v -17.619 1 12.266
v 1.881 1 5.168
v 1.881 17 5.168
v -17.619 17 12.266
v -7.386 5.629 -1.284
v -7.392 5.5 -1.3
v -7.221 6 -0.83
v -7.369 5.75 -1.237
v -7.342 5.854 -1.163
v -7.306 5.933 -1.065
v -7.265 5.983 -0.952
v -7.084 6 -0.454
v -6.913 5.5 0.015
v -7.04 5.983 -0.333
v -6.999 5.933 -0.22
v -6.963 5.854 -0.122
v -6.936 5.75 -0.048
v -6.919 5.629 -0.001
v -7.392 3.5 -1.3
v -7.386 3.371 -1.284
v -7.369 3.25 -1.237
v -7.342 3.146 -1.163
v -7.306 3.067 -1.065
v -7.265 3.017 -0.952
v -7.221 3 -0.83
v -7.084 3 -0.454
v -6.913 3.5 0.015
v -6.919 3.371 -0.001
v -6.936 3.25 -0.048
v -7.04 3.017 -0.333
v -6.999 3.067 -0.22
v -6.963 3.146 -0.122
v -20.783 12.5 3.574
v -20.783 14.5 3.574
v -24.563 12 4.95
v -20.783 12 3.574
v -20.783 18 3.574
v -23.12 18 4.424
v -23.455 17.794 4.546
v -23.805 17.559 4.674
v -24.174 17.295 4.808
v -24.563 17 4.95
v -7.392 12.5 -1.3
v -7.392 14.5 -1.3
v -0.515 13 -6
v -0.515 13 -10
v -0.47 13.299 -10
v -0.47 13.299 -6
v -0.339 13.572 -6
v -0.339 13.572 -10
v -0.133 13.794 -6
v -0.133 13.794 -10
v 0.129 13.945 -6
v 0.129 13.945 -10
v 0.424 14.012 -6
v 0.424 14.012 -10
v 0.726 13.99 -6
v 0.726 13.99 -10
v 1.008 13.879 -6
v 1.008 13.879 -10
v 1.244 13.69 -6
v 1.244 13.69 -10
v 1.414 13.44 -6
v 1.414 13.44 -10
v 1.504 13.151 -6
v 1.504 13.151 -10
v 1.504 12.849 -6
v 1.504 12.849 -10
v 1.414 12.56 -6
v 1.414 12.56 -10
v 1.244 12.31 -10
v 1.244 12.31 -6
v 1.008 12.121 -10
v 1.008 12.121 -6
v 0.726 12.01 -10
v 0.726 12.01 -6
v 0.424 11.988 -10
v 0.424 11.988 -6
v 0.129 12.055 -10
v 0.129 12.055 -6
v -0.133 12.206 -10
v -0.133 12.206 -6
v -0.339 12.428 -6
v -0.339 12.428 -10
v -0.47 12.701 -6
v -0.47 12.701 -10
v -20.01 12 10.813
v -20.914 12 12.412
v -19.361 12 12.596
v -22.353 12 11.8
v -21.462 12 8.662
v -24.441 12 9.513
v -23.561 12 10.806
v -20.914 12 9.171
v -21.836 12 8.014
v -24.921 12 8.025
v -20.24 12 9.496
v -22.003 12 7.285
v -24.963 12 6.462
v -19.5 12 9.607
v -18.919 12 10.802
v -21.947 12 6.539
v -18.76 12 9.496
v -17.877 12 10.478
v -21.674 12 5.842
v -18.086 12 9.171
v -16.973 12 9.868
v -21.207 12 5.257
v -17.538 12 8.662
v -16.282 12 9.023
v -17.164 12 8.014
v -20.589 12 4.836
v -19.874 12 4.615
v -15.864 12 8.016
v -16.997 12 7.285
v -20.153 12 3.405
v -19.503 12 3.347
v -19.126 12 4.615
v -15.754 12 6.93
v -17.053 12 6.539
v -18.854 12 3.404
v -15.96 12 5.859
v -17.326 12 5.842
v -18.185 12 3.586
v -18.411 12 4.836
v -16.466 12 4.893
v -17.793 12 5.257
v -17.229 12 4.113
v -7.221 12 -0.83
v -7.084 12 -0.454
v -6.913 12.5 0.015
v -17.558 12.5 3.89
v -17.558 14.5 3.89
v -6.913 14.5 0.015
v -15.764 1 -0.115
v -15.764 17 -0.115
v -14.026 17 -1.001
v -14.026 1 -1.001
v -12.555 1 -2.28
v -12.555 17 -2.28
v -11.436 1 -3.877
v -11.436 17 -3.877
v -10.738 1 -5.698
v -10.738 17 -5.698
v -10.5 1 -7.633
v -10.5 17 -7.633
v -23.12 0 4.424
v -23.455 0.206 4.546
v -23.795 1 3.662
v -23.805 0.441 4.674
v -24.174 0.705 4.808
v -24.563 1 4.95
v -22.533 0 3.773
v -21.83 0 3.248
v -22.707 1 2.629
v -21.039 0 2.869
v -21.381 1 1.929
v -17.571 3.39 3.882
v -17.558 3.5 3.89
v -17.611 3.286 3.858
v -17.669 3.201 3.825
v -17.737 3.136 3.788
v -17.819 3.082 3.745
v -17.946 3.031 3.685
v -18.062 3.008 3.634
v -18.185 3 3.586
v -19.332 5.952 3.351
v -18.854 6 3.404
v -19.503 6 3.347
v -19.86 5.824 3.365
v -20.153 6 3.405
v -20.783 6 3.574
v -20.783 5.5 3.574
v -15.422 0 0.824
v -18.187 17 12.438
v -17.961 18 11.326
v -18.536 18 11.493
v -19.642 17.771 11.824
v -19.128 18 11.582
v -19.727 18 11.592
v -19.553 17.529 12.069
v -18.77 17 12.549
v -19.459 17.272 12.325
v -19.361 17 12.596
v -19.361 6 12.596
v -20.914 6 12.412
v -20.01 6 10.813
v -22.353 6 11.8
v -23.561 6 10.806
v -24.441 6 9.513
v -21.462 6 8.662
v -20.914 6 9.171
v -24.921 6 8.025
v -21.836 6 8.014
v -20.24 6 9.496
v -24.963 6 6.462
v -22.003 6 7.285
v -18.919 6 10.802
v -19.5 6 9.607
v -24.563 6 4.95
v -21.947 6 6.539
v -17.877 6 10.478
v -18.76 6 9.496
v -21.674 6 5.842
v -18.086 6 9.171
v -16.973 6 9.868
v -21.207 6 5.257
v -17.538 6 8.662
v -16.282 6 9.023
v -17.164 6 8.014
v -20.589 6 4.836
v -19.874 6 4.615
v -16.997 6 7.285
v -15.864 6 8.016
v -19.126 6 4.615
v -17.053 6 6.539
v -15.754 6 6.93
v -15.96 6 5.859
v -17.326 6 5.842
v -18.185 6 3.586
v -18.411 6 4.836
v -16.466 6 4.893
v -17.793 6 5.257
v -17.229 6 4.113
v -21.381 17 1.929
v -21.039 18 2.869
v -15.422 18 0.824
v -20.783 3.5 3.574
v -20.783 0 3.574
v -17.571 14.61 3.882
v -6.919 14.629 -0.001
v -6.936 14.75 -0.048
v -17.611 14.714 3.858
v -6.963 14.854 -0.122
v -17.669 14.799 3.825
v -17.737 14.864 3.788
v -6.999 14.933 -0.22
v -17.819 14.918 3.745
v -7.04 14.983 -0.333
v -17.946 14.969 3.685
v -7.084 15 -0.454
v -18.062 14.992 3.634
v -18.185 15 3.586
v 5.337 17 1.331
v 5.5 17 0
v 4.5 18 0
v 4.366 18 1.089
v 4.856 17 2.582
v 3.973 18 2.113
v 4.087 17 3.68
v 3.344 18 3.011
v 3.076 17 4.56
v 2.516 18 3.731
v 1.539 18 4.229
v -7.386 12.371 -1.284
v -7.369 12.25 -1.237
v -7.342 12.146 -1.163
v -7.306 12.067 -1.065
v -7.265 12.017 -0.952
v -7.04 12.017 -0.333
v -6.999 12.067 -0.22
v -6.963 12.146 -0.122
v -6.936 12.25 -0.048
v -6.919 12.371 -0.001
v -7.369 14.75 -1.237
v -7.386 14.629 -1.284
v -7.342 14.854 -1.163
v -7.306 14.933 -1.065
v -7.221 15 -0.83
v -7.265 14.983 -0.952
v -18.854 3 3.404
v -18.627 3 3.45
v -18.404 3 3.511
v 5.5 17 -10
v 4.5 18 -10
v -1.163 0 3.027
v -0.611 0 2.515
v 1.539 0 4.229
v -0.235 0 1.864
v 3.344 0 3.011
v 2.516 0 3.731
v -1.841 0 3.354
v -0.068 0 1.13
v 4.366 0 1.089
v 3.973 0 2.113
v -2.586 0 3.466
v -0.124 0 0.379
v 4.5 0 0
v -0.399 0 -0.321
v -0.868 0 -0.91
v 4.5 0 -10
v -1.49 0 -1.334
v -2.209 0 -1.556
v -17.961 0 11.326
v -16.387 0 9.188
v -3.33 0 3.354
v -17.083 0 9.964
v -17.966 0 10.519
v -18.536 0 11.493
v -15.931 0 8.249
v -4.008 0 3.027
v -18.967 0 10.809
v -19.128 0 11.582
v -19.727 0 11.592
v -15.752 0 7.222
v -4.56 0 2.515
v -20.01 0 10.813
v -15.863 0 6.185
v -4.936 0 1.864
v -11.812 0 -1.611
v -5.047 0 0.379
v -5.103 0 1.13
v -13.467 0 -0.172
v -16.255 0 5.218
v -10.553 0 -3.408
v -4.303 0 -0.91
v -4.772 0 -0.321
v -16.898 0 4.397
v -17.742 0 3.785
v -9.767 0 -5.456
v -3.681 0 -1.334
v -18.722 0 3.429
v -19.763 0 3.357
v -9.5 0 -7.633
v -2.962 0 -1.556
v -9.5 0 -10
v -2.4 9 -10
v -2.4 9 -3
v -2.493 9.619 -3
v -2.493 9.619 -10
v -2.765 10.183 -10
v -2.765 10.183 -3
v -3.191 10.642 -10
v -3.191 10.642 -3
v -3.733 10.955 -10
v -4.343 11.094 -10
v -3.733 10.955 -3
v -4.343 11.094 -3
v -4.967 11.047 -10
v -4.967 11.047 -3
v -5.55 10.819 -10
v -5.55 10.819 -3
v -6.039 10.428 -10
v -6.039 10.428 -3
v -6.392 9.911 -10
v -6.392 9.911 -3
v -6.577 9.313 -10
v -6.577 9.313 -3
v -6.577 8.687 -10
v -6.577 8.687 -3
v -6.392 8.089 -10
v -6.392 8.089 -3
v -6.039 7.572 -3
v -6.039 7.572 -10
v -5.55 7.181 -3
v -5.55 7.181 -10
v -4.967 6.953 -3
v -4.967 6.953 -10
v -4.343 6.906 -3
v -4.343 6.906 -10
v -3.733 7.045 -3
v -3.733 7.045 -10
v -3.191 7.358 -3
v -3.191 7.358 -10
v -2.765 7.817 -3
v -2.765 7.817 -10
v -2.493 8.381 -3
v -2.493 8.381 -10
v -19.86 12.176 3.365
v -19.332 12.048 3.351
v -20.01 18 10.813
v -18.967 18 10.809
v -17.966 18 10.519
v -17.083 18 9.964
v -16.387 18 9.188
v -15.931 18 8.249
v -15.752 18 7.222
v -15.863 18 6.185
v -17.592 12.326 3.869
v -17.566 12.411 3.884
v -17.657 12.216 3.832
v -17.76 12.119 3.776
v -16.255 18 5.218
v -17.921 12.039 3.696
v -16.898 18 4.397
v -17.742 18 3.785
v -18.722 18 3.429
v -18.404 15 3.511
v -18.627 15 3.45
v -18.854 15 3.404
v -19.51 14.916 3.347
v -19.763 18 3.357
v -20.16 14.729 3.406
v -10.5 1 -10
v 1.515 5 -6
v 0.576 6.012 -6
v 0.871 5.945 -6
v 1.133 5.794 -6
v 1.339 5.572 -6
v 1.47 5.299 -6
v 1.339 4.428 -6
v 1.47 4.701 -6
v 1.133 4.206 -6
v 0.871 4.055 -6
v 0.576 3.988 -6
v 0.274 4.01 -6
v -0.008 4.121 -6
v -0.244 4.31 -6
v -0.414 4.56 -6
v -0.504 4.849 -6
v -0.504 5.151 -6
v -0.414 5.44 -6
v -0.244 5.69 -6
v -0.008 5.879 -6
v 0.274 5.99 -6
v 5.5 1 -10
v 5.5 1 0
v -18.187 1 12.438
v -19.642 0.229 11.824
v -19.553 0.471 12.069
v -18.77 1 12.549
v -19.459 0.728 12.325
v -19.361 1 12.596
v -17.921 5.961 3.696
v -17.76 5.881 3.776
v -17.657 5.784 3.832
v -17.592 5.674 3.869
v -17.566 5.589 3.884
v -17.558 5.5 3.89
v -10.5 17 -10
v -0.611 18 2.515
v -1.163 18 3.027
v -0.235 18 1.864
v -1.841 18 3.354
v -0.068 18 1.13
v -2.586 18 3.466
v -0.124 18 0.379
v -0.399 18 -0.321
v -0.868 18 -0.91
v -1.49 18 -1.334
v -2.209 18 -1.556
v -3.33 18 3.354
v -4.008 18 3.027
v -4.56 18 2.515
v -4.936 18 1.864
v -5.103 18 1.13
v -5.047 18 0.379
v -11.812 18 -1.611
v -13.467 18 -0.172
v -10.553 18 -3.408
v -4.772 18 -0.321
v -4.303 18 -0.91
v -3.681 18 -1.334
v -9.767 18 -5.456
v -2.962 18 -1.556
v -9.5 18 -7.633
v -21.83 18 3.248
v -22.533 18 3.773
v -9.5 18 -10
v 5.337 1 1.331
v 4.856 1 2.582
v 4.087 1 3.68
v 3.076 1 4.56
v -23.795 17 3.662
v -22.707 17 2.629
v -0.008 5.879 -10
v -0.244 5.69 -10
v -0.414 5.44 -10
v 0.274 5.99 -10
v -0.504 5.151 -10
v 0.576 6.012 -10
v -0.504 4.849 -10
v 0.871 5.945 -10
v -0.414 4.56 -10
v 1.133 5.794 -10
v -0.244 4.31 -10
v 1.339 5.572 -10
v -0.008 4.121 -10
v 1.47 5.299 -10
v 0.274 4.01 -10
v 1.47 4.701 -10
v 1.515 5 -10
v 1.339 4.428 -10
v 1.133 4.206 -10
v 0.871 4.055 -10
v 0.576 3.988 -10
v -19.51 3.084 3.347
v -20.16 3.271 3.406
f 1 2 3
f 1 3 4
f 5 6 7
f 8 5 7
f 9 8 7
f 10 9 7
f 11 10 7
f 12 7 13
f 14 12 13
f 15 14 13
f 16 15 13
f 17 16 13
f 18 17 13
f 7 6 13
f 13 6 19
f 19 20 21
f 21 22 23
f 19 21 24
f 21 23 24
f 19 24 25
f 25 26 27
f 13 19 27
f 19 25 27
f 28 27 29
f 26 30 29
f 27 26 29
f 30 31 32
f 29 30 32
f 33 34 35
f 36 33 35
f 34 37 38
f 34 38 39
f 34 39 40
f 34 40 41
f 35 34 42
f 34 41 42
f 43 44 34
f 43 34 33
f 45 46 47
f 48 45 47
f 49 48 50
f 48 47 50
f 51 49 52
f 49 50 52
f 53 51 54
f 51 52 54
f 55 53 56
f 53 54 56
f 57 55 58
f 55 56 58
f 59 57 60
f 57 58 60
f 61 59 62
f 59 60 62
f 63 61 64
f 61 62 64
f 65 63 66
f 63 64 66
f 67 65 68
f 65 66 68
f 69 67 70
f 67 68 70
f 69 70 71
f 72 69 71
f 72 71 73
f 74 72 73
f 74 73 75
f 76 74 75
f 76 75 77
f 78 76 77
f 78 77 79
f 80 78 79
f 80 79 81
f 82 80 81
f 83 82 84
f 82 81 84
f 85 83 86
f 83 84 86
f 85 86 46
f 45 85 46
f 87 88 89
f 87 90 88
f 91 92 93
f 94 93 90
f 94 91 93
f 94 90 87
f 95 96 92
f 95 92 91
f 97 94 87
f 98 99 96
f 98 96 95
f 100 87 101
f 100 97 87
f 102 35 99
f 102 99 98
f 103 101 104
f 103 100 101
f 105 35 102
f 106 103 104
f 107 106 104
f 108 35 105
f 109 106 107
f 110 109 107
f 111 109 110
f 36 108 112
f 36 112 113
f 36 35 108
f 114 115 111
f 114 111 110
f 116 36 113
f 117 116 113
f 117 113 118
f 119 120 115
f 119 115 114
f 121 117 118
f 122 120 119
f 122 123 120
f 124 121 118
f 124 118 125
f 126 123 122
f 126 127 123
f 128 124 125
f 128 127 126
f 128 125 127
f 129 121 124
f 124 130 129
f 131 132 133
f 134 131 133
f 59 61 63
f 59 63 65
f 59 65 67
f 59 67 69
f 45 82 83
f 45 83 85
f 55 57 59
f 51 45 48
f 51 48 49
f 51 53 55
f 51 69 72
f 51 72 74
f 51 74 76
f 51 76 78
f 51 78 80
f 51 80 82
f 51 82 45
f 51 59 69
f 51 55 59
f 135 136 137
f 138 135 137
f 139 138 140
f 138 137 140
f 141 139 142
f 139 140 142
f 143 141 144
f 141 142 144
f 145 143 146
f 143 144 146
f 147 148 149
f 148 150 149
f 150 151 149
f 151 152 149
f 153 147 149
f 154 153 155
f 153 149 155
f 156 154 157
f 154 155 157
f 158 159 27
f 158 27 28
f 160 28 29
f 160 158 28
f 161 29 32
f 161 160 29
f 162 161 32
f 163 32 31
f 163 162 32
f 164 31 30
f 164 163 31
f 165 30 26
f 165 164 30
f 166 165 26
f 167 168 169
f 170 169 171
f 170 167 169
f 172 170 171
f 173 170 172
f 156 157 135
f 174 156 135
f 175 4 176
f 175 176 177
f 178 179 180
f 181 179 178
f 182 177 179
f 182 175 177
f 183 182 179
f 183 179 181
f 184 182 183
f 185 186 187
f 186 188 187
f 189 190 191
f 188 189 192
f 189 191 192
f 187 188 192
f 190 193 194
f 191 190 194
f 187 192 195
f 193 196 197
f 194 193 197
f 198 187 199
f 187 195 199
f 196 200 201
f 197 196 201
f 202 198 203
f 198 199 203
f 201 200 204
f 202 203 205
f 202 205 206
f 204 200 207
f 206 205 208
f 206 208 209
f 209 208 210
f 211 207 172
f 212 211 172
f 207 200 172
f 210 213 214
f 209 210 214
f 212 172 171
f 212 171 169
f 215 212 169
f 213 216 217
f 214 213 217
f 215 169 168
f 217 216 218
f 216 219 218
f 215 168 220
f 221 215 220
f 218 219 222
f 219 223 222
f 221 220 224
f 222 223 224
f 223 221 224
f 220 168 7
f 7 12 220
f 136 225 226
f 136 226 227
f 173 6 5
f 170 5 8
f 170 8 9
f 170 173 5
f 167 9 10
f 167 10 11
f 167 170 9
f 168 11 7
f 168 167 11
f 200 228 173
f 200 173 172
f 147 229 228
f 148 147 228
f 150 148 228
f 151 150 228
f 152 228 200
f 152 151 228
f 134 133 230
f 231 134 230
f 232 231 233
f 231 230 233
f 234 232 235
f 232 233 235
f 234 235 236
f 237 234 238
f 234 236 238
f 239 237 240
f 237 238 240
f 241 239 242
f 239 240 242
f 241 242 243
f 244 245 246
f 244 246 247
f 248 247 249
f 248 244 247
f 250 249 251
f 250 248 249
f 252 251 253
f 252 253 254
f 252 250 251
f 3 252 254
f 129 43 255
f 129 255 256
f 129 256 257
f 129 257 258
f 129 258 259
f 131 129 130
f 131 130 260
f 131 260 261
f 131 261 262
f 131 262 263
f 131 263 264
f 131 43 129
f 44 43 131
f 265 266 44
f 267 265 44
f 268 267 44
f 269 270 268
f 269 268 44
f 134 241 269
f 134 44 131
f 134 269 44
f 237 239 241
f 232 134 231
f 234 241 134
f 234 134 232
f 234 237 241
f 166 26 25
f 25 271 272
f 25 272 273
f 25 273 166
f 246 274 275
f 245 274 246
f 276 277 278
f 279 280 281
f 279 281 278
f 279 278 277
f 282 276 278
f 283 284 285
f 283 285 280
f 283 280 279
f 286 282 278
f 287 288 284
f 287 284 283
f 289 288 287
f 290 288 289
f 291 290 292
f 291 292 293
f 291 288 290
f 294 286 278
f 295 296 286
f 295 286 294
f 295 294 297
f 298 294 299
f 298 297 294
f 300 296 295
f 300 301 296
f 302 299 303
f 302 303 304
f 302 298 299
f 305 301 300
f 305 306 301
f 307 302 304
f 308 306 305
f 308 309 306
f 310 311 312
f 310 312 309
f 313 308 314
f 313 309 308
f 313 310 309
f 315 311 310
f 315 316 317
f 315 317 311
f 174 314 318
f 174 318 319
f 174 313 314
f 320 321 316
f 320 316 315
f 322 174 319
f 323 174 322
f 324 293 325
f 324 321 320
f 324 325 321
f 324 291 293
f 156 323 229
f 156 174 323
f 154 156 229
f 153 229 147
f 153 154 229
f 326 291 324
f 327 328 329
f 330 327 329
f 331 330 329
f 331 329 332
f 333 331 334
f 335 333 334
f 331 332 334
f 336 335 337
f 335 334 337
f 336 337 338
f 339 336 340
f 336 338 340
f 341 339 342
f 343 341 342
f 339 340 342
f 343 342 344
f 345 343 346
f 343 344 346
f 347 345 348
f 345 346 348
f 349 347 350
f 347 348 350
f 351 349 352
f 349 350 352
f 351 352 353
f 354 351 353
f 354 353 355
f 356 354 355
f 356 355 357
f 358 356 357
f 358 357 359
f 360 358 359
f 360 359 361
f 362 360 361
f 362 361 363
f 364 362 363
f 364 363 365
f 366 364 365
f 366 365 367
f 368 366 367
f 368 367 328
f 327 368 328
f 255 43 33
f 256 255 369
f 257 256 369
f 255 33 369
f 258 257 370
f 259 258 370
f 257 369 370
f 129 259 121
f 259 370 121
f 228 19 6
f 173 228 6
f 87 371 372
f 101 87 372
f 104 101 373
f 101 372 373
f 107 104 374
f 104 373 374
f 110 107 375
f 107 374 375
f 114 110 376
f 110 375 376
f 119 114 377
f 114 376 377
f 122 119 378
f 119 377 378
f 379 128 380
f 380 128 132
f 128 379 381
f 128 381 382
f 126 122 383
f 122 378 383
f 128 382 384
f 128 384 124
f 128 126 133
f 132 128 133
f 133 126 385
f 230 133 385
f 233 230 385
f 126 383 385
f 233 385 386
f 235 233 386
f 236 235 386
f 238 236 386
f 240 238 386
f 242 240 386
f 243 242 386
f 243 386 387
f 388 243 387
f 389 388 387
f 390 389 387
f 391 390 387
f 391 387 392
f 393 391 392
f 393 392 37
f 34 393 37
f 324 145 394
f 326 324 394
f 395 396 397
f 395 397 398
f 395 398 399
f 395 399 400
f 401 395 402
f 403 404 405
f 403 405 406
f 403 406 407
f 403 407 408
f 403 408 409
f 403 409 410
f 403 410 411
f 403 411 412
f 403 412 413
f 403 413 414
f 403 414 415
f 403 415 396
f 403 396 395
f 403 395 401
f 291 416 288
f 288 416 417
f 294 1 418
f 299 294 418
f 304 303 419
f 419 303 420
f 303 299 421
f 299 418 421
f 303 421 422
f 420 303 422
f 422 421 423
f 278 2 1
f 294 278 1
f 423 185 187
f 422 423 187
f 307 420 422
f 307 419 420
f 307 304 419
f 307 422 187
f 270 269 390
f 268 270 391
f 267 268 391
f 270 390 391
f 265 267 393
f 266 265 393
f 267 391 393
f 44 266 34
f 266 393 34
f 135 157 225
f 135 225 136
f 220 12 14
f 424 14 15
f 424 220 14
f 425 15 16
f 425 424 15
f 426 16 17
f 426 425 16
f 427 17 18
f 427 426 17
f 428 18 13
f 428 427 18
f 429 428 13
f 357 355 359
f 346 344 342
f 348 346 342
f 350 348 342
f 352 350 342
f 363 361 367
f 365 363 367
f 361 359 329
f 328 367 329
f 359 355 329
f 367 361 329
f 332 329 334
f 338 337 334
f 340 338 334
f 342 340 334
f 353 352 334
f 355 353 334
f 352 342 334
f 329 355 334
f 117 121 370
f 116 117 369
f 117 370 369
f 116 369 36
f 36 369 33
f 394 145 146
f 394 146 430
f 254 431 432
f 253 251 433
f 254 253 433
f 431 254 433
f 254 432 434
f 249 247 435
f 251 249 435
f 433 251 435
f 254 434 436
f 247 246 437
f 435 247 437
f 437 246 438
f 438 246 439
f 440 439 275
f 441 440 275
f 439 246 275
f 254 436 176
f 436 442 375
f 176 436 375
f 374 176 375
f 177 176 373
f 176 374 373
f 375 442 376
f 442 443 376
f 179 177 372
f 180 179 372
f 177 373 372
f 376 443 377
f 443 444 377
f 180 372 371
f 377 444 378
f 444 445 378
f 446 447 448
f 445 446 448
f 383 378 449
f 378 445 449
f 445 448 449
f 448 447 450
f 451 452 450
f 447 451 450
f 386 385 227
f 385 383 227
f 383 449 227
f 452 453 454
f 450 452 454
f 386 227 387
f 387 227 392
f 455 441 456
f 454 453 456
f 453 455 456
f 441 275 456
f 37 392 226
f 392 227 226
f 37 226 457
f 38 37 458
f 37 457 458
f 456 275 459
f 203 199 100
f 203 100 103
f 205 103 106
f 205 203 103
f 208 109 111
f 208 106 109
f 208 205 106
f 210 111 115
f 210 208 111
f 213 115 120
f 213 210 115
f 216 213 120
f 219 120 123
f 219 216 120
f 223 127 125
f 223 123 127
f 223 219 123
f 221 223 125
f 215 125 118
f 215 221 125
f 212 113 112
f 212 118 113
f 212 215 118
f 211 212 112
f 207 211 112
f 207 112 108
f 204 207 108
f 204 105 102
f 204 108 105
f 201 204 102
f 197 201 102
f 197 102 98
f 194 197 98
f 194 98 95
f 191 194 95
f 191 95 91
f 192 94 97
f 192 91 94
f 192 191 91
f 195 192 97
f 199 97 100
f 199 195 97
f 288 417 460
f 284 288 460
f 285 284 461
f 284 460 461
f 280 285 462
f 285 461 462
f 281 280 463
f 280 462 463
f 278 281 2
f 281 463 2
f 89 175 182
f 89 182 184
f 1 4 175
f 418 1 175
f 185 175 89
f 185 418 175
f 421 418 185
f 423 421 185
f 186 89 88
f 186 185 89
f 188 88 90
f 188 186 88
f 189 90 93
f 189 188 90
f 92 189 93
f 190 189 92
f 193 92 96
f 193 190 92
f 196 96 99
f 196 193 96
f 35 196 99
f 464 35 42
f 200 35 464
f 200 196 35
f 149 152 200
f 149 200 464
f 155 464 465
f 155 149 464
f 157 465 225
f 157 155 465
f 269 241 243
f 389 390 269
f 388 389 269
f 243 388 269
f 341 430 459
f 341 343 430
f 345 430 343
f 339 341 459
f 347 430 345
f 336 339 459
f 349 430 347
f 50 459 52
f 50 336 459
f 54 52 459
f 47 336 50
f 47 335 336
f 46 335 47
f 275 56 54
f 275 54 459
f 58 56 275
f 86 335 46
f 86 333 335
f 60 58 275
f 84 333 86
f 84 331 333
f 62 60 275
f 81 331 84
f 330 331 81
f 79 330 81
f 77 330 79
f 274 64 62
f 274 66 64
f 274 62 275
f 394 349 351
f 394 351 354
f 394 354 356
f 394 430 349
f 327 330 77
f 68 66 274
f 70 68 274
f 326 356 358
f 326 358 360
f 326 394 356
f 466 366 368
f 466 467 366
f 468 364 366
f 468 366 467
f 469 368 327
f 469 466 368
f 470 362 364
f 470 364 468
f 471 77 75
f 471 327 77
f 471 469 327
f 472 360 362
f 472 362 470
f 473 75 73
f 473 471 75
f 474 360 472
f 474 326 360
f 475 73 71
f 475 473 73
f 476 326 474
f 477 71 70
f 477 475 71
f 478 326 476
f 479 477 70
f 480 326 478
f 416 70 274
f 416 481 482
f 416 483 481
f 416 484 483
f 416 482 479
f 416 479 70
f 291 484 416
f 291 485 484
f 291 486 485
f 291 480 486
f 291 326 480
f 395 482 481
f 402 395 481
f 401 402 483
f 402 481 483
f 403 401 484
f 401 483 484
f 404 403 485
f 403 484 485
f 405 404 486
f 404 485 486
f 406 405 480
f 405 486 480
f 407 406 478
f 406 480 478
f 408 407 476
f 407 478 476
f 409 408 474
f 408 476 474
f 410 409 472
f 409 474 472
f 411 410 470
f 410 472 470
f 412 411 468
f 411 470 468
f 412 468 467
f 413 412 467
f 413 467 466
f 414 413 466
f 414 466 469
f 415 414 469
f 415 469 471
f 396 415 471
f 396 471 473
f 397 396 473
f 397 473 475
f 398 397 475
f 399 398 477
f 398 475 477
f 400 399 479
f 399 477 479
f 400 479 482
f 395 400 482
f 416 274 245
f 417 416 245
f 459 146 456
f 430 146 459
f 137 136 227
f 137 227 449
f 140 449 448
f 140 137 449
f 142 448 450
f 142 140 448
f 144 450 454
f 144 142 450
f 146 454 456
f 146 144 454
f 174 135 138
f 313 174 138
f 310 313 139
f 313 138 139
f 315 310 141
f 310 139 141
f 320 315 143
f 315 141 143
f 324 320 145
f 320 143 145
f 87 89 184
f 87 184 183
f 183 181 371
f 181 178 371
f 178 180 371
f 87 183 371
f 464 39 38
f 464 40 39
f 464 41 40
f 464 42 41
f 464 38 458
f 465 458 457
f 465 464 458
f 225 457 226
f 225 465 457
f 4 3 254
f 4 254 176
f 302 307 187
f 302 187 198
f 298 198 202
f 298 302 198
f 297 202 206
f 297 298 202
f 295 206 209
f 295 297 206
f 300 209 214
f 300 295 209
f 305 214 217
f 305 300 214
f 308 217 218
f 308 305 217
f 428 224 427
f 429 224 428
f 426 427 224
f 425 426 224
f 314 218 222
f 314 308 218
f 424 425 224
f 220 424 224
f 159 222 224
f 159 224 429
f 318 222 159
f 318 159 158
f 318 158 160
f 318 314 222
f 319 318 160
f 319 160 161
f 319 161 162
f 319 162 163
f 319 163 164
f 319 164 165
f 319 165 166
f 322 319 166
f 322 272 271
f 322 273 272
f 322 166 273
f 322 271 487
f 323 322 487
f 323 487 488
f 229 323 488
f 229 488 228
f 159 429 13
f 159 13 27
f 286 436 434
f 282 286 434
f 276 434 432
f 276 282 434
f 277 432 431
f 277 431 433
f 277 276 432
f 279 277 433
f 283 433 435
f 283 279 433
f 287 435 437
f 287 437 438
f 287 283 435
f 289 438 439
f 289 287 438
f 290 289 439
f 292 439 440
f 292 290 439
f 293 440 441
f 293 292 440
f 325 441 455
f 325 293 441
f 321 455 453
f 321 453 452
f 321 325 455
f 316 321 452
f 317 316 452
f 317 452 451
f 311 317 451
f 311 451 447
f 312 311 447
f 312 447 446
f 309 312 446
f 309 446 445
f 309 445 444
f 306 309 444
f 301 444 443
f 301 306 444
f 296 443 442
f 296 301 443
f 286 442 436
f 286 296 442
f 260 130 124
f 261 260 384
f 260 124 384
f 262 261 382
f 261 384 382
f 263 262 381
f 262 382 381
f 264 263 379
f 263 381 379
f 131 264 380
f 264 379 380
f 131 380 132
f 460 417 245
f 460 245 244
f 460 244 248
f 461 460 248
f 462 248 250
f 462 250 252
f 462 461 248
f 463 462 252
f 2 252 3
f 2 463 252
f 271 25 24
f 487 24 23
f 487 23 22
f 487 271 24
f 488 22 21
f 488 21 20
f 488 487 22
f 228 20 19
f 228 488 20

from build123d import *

# Parameters (mm, degrees)
SKETCH_1_R             = 2.51
SKETCH_1_R_2           = 2.525
EXTRUDE_1_DEPTH        = 18
SKETCH_11_R            = 3.75
CUT_EXTRUDE_5_DEPTH    = 6
FILLET_1_R             = 8
SKETCH_12_R            = 2
CUT_EXTRUDE_6_DEPTH    = 7
CHAMFER_1_SIZE         = 1
CUT_EXTRUDE_8_DEPTH    = 6
SKETCH_18_R            = 1.015
CUT_EXTRUDE_10_DEPTH   = 4
CUT_EXTRUDE_11_DEPTH   = 16
HOLE_WIZARD_M5_1_D     = 4.2
HOLE_WIZARD_M5_1_DEPTH = 7


with BuildPart() as part:
    # 草图1 → 凸台-拉伸1 (new body)
    with BuildSketch(Plane(origin=(0, 0, 0), x_dir=(1, 0, 0), z_dir=(0, 1, 0))):
        with BuildLine():
            Line((-21.381110788, -1.929110154), (-10.5, 2.031290289))
            Line((-10.5, 2.031290289), (-10.5, 10))
            Line((-10.5, 10), (5.5, 10))
            Line((5.5, 10), (5.5, 0))
            ThreePointArc((5.5, 0), (4.505336244, -3.1546704), (1.881110788, -5.168309414))
            Line((1.881110788, -5.168309414), (-17.618889212, -12.265728983))
            ThreePointArc((-17.618889212, -12.265728983), (-24.668309414, -8.978530356), (-21.381110788, -1.929110154))
        make_face()
        with Locations(Location((-19.5, -7.097419568, 0), (0, 0, 270))):
            Circle(SKETCH_1_R, mode=Mode.SUBTRACT)
        with Locations(Location((-2.585532826, -0.941056988, 0), (0, 0, 270))):
            Circle(SKETCH_1_R_2, mode=Mode.SUBTRACT)
    extrude(amount=EXTRUDE_1_DEPTH)

    # 草图11 → 切除-拉伸5 (cut)
    with BuildSketch(Plane(origin=(0, 18, 0), x_dir=(1, 0, 0), z_dir=(0, 1, 0))):
        with Locations(Location((-19.5, -7.097419568, 0), (0, 0, 270))):
            Circle(SKETCH_11_R)
    cut_extrude_5 = extrude(amount=-CUT_EXTRUDE_5_DEPTH, mode=Mode.SUBTRACT)

    # 圆角1
    fillet_1_edges = [part.edges().sort_by_distance(p)[0] for p in [
        (-10.5, 9, -2.031290289),
    ]]
    fillet(fillet_1_edges, radius=FILLET_1_R)

    # 草图12 → 切除-拉伸6 (cut)
    with BuildSketch(Plane(origin=(0, 0, -10), x_dir=(-1, 0, 0), z_dir=(0, 0, -1))):
        with Locations((4.5, 9)):
            Circle(SKETCH_12_R)
    extrude(amount=-CUT_EXTRUDE_6_DEPTH, mode=Mode.SUBTRACT)

    # 倒角1
    chamfer_1_edges = [part.edges().sort_by_distance(p)[0] for p in [
        (-24.668309414, 0, 8.978530356),
        (4.505336244, 18, 3.1546704),
        (5.5, 18, -5),
        (-10.5, 18, -8.816475297),
        (-18.572474821, 0, 0.906850263),
        (-18.572474821, 18, 0.906850263),
        (-11.946783646, 0, -3.044339104),
        (-11.946783646, 18, -3.044339104),
        (-24.668309414, 18, 8.978530356),
        (-10.5, 0, -8.816475297),
        (5.5, 0, -5),
        (-7.868889212, 18, 8.717019198),
        (4.505336244, 0, 3.1546704),
        (-7.868889212, 0, 8.717019198),
    ]]
    chamfer(chamfer_1_edges, length=CHAMFER_1_SIZE)

    # 草图15 → 切除-拉伸8 (cut)
    with BuildSketch(Plane(origin=(0, 18, 0), x_dir=(1, 0, 0), z_dir=(0, 1, 0))):
        with BuildLine():
            Line((-20.782575537, -3.57357224), (-28.300116504, -6.309733387))
            Line((-28.300116504, -6.309733387), (-24.879915071, -15.706659595))
            Line((-24.879915071, -15.706659595), (-19.006836191, -13.569033699))
            Line((-19.006836191, -13.569033699), (-20.0101096, -10.81256266))
            ThreePointArc((-20.0101096, -10.81256266), (-23.228830323, -7.495319585), (-20.782575537, -3.57357224))
        make_face()
    cut_extrude_8 = extrude(amount=-CUT_EXTRUDE_8_DEPTH, mode=Mode.SUBTRACT)

    # 草图18 → 切除-拉伸10 (cut)
    with BuildSketch(Plane(origin=(0, 0, -10), x_dir=(-1, 0, 0), z_dir=(0, 0, -1))):
        with Locations((-0.5, 13)):
            Circle(SKETCH_18_R)
        with Locations(Location((-0.5, 5, 0), (0, 0, 180))):
            Circle(SKETCH_18_R)
    extrude(amount=-CUT_EXTRUDE_10_DEPTH, mode=Mode.SUBTRACT)

    # 草图19 → 切除-拉伸11 (cut)
    with BuildSketch(Plane(origin=(-21.144462086, 0, 7.695954819), x_dir=(0.3420201433256672, 0, 0.939692620785909), z_dir=(-0.9396926207859089, 0, 0.34202014332566716))):
        with BuildLine():
            Line((-3.25, 12), (-2.85, 12))
            ThreePointArc((-2.85, 12), (-2.496446609, 12.146446609), (-2.35, 12.5))
            Line((-2.35, 12.5), (-2.35, 14.5))
            ThreePointArc((-2.35, 14.5), (-2.496446609, 14.853553391), (-2.85, 15))
            Line((-2.85, 15), (-3.25, 15))
            ThreePointArc((-3.25, 15), (-3.603553391, 14.853553391), (-3.75, 14.5))
            Line((-3.75, 14.5), (-3.75, 12.5))
            ThreePointArc((-3.75, 12.5), (-3.603553391, 12.146446609), (-3.25, 12))
        make_face()
    cut_extrude_11 = extrude(amount=-CUT_EXTRUDE_11_DEPTH, mode=Mode.SUBTRACT)

    # 镜向3: 切除-拉伸5, 切除-拉伸8, 切除-拉伸11 across plane
    add(cut_extrude_5.mirror(Plane(origin=(0, 9, 0), x_dir=(0, 0, 1), z_dir=(0, -1, 0))), mode=Mode.SUBTRACT)
    add(cut_extrude_8.mirror(Plane(origin=(0, 9, 0), x_dir=(0, 0, 1), z_dir=(0, -1, 0))), mode=Mode.SUBTRACT)
    add(cut_extrude_11.mirror(Plane(origin=(0, 9, 0), x_dir=(0, 0, 1), z_dir=(0, -1, 0))), mode=Mode.SUBTRACT)

    # M5 螺纹孔1
    with Locations(Plane(origin=(0, 0, -10), x_dir=(-1, 0, 0), z_dir=(0, 0, -1))):
        with Locations((4.5, 9)):
            Hole(HOLE_WIZARD_M5_1_D / 2, depth=HOLE_WIZARD_M5_1_DEPTH)


solid = part.part
